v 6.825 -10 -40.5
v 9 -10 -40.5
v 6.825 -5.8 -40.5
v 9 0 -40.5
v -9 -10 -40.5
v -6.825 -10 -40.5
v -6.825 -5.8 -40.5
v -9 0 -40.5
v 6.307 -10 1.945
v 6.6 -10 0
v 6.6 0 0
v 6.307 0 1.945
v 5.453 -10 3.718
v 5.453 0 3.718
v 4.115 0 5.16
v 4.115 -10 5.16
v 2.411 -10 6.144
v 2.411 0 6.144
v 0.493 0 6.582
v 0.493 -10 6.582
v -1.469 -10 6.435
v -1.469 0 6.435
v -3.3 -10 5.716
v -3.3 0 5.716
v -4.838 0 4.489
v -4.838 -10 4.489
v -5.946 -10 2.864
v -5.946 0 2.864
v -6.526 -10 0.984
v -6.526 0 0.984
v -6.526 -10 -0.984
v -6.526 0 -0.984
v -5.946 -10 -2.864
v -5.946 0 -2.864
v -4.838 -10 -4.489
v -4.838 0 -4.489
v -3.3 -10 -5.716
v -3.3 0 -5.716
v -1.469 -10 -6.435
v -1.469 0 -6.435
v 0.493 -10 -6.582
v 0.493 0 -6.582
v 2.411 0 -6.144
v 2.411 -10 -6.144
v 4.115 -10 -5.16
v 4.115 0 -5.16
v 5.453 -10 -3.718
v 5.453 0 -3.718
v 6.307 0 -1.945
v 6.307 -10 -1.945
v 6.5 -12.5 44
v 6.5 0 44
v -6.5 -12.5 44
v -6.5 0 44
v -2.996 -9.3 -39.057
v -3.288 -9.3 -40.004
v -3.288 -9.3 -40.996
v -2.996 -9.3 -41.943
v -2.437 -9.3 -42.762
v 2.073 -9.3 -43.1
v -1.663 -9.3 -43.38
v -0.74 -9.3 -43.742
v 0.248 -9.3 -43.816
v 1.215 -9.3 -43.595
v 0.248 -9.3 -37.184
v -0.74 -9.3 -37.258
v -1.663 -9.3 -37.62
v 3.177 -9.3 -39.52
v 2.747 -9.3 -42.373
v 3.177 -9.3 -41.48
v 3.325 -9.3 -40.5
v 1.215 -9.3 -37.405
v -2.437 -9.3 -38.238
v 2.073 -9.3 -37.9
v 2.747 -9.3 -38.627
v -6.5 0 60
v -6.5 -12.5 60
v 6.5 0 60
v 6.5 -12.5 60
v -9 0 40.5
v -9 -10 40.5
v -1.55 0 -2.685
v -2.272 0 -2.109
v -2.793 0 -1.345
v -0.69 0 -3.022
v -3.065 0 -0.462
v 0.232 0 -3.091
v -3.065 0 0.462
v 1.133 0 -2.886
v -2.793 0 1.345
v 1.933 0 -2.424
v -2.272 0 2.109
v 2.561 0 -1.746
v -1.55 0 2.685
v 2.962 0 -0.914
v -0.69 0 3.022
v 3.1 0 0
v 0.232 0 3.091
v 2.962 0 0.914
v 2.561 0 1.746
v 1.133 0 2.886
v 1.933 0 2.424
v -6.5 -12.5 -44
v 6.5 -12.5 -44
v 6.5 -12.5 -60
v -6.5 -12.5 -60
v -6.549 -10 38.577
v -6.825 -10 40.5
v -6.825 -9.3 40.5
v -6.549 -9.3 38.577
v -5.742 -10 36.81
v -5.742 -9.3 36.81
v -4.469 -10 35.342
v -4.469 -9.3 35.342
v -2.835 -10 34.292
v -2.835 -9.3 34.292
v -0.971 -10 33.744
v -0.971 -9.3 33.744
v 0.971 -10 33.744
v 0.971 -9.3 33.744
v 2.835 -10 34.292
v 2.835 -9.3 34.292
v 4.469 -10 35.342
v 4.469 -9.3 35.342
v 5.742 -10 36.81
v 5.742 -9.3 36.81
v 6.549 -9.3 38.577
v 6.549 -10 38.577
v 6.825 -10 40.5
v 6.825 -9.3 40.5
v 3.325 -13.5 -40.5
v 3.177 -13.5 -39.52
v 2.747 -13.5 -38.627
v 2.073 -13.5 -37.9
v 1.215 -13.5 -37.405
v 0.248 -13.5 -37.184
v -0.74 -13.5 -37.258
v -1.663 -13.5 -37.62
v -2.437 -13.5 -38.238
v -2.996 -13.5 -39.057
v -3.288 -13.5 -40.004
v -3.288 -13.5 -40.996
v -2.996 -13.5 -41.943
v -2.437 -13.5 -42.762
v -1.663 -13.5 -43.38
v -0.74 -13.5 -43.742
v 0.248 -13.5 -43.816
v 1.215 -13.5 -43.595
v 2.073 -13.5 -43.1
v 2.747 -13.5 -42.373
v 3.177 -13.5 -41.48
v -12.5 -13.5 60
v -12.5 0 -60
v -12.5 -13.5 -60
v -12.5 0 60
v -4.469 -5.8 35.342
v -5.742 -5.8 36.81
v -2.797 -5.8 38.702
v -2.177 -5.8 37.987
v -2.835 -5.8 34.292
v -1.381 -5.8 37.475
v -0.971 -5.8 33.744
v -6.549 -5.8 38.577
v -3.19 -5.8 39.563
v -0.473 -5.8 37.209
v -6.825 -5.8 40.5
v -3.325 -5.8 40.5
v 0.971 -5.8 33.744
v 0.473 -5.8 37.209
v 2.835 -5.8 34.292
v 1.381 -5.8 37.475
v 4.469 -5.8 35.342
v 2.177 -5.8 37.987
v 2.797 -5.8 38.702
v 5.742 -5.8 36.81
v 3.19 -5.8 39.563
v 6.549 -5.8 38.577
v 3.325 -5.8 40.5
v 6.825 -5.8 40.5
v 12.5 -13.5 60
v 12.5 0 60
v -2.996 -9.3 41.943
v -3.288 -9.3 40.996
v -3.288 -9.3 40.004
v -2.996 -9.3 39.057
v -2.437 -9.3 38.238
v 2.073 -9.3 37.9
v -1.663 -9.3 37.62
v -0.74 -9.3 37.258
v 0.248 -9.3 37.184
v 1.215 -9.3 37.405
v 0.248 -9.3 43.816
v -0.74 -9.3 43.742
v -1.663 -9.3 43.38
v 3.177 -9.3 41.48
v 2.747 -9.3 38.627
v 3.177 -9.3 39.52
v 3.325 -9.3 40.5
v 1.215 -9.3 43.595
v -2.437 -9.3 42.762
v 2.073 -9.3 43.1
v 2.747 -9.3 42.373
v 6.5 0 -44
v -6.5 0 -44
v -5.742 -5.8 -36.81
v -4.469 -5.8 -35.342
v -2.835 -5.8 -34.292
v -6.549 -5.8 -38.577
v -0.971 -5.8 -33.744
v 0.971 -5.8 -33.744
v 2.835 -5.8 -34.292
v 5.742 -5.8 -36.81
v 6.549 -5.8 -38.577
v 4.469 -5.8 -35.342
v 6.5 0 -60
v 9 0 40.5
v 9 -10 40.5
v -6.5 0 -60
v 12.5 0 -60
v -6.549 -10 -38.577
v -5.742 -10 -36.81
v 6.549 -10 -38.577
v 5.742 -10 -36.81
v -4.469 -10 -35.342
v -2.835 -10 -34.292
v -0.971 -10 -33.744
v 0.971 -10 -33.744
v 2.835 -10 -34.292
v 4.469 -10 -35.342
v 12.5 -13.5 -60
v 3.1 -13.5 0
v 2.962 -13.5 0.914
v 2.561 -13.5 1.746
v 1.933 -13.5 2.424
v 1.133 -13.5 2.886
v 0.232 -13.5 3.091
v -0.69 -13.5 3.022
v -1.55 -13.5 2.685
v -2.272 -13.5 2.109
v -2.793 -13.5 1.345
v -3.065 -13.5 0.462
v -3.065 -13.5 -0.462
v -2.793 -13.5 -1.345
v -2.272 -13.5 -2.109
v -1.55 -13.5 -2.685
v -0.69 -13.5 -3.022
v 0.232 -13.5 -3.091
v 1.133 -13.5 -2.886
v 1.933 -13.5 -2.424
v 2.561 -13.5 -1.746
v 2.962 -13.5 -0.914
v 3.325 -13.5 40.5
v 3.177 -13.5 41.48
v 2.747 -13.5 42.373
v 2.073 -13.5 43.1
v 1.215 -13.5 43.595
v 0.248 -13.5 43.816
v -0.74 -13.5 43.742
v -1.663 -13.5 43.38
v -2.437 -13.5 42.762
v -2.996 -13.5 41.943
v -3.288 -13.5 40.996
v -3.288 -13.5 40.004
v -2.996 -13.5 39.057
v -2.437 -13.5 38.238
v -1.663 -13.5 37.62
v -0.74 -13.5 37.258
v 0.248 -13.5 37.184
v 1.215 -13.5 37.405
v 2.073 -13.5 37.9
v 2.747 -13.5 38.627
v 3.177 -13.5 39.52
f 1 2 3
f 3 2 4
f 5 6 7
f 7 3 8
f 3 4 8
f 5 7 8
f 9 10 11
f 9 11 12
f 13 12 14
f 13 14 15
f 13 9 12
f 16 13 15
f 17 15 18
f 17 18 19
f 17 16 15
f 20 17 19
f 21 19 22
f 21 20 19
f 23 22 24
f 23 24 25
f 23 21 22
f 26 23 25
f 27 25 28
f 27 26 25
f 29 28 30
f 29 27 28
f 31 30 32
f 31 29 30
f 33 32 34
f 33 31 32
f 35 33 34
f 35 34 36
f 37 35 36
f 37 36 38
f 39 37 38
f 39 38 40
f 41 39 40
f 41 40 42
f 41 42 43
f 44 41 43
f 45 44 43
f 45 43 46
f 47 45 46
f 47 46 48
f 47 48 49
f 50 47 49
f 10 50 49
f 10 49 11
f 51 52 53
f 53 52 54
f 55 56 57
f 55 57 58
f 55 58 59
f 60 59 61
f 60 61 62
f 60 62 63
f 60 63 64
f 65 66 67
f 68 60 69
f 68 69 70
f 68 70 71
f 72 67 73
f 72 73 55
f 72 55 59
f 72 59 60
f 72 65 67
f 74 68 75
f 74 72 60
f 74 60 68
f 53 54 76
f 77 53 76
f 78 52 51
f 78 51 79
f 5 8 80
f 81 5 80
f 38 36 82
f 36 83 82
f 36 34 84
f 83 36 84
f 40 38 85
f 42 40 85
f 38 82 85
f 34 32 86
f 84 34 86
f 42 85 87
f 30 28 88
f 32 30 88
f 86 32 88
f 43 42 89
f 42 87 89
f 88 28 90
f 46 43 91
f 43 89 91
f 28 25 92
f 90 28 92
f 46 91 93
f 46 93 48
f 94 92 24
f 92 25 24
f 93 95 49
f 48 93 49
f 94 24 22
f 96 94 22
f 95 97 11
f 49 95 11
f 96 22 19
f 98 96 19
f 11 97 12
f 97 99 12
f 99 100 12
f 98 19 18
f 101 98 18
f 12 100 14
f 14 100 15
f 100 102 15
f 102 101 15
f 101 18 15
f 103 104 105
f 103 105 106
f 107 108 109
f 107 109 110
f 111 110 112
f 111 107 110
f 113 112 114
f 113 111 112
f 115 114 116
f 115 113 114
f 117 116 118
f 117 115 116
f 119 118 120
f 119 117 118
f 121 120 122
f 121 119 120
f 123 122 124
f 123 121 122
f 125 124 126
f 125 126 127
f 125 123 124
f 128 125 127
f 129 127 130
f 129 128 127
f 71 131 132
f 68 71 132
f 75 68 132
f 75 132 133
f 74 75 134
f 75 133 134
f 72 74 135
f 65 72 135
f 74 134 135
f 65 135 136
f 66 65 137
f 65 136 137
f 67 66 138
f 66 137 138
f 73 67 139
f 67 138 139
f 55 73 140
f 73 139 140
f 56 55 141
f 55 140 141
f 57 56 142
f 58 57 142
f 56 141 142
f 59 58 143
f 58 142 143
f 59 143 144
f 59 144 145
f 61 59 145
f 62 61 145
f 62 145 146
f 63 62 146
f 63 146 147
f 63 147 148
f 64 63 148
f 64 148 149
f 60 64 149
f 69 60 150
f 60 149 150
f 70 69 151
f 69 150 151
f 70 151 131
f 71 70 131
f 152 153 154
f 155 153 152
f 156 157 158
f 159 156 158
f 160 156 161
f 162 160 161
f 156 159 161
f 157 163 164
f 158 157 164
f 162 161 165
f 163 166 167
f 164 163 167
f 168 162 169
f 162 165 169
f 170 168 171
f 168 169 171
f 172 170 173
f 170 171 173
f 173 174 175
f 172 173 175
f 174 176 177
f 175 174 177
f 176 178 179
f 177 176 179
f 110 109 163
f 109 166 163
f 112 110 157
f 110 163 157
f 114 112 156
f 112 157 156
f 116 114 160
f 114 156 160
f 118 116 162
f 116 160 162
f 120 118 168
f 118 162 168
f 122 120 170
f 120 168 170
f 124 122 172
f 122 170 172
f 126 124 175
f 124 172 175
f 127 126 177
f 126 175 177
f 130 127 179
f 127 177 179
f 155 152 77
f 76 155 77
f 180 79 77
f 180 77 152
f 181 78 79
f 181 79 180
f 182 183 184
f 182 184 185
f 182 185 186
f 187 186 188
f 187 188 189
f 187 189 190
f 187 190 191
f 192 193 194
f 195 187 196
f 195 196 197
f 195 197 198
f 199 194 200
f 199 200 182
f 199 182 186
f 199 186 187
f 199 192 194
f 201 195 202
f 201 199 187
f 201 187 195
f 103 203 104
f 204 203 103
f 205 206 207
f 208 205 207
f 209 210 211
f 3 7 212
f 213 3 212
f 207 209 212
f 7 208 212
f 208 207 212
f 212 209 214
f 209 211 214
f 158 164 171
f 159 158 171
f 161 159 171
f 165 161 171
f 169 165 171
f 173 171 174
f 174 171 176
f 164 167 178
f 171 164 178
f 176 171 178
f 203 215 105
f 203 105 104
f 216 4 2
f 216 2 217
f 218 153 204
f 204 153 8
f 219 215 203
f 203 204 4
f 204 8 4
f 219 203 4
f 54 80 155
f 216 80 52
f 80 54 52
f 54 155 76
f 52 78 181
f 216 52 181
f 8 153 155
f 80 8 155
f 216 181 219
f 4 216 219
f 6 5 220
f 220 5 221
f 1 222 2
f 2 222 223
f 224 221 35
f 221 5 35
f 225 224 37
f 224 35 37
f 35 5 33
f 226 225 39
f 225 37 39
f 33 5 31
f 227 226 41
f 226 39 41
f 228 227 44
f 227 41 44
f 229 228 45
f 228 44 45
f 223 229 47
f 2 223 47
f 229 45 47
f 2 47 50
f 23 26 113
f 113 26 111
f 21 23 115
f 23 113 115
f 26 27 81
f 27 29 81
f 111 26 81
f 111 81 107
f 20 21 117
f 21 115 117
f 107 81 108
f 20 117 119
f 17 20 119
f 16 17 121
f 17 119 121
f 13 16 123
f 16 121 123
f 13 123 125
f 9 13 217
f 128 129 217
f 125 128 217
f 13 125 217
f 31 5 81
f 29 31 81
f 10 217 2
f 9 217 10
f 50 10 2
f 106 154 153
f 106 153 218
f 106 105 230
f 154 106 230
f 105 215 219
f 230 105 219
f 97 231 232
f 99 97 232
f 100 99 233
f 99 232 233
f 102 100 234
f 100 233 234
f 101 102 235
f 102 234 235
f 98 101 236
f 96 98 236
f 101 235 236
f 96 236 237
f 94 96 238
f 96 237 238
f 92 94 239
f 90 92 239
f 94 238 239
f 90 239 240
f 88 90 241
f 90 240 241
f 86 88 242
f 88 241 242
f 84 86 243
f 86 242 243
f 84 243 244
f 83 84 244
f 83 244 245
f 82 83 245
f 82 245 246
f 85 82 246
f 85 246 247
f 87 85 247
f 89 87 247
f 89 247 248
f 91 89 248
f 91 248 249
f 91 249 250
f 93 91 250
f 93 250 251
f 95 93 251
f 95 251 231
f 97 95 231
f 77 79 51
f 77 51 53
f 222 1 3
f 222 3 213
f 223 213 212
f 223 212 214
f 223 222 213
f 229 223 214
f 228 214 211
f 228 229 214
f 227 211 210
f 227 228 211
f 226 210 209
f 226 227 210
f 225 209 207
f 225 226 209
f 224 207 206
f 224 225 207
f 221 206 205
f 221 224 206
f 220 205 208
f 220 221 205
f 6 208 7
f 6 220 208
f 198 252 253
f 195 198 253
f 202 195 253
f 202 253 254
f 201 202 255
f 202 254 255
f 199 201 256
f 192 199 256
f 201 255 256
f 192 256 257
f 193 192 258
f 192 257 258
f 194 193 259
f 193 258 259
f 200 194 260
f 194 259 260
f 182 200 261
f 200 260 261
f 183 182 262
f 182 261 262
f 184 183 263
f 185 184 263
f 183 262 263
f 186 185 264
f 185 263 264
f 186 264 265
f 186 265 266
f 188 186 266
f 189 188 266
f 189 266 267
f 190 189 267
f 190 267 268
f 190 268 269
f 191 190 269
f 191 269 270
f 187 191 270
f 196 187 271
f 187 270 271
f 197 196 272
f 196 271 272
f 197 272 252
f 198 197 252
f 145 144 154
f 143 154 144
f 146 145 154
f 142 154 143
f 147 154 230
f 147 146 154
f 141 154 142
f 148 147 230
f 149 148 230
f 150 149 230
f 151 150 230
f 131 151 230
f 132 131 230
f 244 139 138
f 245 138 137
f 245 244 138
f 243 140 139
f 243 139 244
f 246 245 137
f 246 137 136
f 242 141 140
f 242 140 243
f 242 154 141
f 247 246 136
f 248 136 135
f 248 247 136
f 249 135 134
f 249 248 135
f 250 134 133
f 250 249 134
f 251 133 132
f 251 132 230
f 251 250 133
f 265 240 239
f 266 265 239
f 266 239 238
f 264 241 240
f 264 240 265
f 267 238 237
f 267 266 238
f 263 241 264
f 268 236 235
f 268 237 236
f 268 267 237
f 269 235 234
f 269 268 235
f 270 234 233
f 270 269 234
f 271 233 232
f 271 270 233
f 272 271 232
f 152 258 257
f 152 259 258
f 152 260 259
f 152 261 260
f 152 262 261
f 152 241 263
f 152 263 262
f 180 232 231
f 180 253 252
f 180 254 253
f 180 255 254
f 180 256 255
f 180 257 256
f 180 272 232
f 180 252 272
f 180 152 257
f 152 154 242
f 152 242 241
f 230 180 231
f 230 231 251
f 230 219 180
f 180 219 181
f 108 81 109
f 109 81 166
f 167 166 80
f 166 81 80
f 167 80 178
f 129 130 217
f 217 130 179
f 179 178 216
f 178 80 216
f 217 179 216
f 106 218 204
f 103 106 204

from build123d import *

# Parameters (mm, degrees)
F0_W        = 25
F0_H        = 120
F1_DEPTH    = 13.5
F2_R        = 3.1
F3_DEPTH    = 13.501
F4_W        = 13
F4_H        = 17.8598619506
F5_DEPTH    = 12.5
F6_R        = 3.325
F7_DEPTH    = 4.2
F8_T        = 3.5
F8_T3_DEPTH = 19.5
F8_T5_DEPTH = 23
F8_T7_DEPTH = 20
F8_T9_DEPTH = 23


# Not quite as in the source:
# - a shell that OpenCascade refuses in one call is made with other operations: the cavity is built on its own and cut out


with BuildPart() as f1:
    # F0 (on Front) → F1 (new body)
    with BuildSketch(Plane.XZ):
        Rectangle(F0_W, F0_H)
    extrude(amount=F1_DEPTH)

    # F2 (on face) → F3 (cut, through all)
    with BuildSketch(Plane.XZ.offset(13.5)):
        Circle(F2_R)
    extrude(amount=-F3_DEPTH, mode=Mode.SUBTRACT)

    # F4 (on face) → F5 (cut)
    with BuildSketch(Plane(origin=(0, 0, 0), x_dir=(-1, 0, 0), z_dir=(0, 1, 0))):
        with Locations((0, 52.9299309753)):
            Rectangle(F4_W, F4_H)
        with Locations((0, -52.9299309753)):
            Rectangle(F4_W, F4_H)
    extrude(amount=-F5_DEPTH, mode=Mode.SUBTRACT)

    # F6 (on face) → F7 (cut)
    with BuildSketch(Plane.XZ.offset(13.5)):
        with Locations((0, -40.5)):
            Circle(F6_R)
        with Locations((0, 40.5)):
            Circle(F6_R)
    extrude(amount=-F7_DEPTH, mode=Mode.SUBTRACT)

    # F8: shell of thickness 3.5, made by hand


with BuildPart() as f8_core1:
    # F8_t2: copy of F1
    add(f1.part)

    # the walls: a layer under each face that stays
    f8_faces = [f8_core1.faces().sort_by_distance(p)[0] for p in [
        (12.5, -6.75, 0),
        (-8.3333333333, -11.25, -60),
        (8.3333333333, -11.25, 60),
        (-8.3333333333, -13.5, -40),
        (-6.5, -6.25, -52),
        (0, -12.5, -52),
        (6.5, -6.25, -52),
        (-12.5, -6.75, 0),
        (6.5, -6.25, 52),
        (0, -12.5, 52),
        (-6.5, -6.25, 52),
        (0, -6.25, -44),
        (0, -6.25, 44),
        (-3.1, -6.75, 0),
        (-3.325, -11.4, -40.5),
        (-3.325, -11.4, 40.5),
        (0, -9.3, -40.5),
        (0, -9.3, 40.5),
    ]]
    thicken(f8_faces, amount=-F8_T, mode=Mode.SUBTRACT)

    # F8_s4 → F8_t3 (cut)
    with BuildSketch(Plane.XZ.offset(-3.5)):
        Polygon((-6.465, -44.035), (-10, -44), (-10, -40.5), (-6.5, -40.5), align=None)
        Polygon((6.465, -44.035), (10, -44), (10, -40.5), (6.5, -40.5), align=None)
        Polygon((6.465, 44.035), (10, 44), (10, 40.5), (6.5, 40.5), align=None)
        Polygon((-6.465, 44.035), (-10, 44), (-10, 40.5), (-6.5, 40.5), align=None)
    extrude(amount=F8_T3_DEPTH, mode=Mode.SUBTRACT)

    # F8_s6 → F8_t5 (cut)
    with BuildSketch(Plane.XY.offset(-63.5)):
        Polygon((-6.465, -12.465), (-10, -12.5), (-10, -16), (-6.5, -16), align=None)
        Polygon((6.465, -12.465), (6.5, -16), (10, -16), (10, -12.5), align=None)
    extrude(amount=F8_T5_DEPTH, mode=Mode.SUBTRACT)

    # F8_s8 → F8_t7 (cut)
    with BuildSketch(Plane.YZ.offset(-10)):
        Polygon((-12.465, -44.035), (-16, -44), (-16, -40.5), (-12.5, -40.5), align=None)
        Polygon((-12.465, 44.035), (-16, 44), (-16, 40.5), (-12.5, 40.5), align=None)
    extrude(amount=F8_T7_DEPTH, mode=Mode.SUBTRACT)

    # F8_s10 → F8_t9 (cut)
    with BuildSketch(Plane.XY.offset(40.5)):
        Polygon((6.465, -12.465), (10, -12.5), (10, -16), (6.5, -16), align=None)
        Polygon((-6.465, -12.465), (-6.5, -16), (-10, -16), (-10, -12.5), align=None)
    extrude(amount=F8_T9_DEPTH, mode=Mode.SUBTRACT)

    # F8_s11 → F8_t12 (revolve, cut)
    with BuildSketch(Plane.XY.offset(-40.5)):
        Polygon((3.29, -9.335), (6.825, -9.3), (6.825, -5.8), (3.325, -5.8), align=None)
    revolve(axis=Axis((0, -9.3, -40.5), (0, -1, 0)), mode=Mode.SUBTRACT)

    # F8_s13 → F8_t14 (revolve, cut)
    with BuildSketch(Plane.XY.offset(40.5)):
        Polygon((3.29, -9.335), (6.825, -9.3), (6.825, -5.8), (3.325, -5.8), align=None)
    revolve(axis=Axis((0, -9.3, 40.5), (0, -1, 0)), mode=Mode.SUBTRACT)


with BuildPart() as f1_1:
    add(f1.part)

    # what is left inside the walls is the cavity
    f8_cavity = [f8_core1.part.solids().sort_by_distance(p)[0] for p in [
        (0, -0.035, -13.5),
    ]]
    add(f8_cavity, mode=Mode.SUBTRACT)


solid = f1_1.part
